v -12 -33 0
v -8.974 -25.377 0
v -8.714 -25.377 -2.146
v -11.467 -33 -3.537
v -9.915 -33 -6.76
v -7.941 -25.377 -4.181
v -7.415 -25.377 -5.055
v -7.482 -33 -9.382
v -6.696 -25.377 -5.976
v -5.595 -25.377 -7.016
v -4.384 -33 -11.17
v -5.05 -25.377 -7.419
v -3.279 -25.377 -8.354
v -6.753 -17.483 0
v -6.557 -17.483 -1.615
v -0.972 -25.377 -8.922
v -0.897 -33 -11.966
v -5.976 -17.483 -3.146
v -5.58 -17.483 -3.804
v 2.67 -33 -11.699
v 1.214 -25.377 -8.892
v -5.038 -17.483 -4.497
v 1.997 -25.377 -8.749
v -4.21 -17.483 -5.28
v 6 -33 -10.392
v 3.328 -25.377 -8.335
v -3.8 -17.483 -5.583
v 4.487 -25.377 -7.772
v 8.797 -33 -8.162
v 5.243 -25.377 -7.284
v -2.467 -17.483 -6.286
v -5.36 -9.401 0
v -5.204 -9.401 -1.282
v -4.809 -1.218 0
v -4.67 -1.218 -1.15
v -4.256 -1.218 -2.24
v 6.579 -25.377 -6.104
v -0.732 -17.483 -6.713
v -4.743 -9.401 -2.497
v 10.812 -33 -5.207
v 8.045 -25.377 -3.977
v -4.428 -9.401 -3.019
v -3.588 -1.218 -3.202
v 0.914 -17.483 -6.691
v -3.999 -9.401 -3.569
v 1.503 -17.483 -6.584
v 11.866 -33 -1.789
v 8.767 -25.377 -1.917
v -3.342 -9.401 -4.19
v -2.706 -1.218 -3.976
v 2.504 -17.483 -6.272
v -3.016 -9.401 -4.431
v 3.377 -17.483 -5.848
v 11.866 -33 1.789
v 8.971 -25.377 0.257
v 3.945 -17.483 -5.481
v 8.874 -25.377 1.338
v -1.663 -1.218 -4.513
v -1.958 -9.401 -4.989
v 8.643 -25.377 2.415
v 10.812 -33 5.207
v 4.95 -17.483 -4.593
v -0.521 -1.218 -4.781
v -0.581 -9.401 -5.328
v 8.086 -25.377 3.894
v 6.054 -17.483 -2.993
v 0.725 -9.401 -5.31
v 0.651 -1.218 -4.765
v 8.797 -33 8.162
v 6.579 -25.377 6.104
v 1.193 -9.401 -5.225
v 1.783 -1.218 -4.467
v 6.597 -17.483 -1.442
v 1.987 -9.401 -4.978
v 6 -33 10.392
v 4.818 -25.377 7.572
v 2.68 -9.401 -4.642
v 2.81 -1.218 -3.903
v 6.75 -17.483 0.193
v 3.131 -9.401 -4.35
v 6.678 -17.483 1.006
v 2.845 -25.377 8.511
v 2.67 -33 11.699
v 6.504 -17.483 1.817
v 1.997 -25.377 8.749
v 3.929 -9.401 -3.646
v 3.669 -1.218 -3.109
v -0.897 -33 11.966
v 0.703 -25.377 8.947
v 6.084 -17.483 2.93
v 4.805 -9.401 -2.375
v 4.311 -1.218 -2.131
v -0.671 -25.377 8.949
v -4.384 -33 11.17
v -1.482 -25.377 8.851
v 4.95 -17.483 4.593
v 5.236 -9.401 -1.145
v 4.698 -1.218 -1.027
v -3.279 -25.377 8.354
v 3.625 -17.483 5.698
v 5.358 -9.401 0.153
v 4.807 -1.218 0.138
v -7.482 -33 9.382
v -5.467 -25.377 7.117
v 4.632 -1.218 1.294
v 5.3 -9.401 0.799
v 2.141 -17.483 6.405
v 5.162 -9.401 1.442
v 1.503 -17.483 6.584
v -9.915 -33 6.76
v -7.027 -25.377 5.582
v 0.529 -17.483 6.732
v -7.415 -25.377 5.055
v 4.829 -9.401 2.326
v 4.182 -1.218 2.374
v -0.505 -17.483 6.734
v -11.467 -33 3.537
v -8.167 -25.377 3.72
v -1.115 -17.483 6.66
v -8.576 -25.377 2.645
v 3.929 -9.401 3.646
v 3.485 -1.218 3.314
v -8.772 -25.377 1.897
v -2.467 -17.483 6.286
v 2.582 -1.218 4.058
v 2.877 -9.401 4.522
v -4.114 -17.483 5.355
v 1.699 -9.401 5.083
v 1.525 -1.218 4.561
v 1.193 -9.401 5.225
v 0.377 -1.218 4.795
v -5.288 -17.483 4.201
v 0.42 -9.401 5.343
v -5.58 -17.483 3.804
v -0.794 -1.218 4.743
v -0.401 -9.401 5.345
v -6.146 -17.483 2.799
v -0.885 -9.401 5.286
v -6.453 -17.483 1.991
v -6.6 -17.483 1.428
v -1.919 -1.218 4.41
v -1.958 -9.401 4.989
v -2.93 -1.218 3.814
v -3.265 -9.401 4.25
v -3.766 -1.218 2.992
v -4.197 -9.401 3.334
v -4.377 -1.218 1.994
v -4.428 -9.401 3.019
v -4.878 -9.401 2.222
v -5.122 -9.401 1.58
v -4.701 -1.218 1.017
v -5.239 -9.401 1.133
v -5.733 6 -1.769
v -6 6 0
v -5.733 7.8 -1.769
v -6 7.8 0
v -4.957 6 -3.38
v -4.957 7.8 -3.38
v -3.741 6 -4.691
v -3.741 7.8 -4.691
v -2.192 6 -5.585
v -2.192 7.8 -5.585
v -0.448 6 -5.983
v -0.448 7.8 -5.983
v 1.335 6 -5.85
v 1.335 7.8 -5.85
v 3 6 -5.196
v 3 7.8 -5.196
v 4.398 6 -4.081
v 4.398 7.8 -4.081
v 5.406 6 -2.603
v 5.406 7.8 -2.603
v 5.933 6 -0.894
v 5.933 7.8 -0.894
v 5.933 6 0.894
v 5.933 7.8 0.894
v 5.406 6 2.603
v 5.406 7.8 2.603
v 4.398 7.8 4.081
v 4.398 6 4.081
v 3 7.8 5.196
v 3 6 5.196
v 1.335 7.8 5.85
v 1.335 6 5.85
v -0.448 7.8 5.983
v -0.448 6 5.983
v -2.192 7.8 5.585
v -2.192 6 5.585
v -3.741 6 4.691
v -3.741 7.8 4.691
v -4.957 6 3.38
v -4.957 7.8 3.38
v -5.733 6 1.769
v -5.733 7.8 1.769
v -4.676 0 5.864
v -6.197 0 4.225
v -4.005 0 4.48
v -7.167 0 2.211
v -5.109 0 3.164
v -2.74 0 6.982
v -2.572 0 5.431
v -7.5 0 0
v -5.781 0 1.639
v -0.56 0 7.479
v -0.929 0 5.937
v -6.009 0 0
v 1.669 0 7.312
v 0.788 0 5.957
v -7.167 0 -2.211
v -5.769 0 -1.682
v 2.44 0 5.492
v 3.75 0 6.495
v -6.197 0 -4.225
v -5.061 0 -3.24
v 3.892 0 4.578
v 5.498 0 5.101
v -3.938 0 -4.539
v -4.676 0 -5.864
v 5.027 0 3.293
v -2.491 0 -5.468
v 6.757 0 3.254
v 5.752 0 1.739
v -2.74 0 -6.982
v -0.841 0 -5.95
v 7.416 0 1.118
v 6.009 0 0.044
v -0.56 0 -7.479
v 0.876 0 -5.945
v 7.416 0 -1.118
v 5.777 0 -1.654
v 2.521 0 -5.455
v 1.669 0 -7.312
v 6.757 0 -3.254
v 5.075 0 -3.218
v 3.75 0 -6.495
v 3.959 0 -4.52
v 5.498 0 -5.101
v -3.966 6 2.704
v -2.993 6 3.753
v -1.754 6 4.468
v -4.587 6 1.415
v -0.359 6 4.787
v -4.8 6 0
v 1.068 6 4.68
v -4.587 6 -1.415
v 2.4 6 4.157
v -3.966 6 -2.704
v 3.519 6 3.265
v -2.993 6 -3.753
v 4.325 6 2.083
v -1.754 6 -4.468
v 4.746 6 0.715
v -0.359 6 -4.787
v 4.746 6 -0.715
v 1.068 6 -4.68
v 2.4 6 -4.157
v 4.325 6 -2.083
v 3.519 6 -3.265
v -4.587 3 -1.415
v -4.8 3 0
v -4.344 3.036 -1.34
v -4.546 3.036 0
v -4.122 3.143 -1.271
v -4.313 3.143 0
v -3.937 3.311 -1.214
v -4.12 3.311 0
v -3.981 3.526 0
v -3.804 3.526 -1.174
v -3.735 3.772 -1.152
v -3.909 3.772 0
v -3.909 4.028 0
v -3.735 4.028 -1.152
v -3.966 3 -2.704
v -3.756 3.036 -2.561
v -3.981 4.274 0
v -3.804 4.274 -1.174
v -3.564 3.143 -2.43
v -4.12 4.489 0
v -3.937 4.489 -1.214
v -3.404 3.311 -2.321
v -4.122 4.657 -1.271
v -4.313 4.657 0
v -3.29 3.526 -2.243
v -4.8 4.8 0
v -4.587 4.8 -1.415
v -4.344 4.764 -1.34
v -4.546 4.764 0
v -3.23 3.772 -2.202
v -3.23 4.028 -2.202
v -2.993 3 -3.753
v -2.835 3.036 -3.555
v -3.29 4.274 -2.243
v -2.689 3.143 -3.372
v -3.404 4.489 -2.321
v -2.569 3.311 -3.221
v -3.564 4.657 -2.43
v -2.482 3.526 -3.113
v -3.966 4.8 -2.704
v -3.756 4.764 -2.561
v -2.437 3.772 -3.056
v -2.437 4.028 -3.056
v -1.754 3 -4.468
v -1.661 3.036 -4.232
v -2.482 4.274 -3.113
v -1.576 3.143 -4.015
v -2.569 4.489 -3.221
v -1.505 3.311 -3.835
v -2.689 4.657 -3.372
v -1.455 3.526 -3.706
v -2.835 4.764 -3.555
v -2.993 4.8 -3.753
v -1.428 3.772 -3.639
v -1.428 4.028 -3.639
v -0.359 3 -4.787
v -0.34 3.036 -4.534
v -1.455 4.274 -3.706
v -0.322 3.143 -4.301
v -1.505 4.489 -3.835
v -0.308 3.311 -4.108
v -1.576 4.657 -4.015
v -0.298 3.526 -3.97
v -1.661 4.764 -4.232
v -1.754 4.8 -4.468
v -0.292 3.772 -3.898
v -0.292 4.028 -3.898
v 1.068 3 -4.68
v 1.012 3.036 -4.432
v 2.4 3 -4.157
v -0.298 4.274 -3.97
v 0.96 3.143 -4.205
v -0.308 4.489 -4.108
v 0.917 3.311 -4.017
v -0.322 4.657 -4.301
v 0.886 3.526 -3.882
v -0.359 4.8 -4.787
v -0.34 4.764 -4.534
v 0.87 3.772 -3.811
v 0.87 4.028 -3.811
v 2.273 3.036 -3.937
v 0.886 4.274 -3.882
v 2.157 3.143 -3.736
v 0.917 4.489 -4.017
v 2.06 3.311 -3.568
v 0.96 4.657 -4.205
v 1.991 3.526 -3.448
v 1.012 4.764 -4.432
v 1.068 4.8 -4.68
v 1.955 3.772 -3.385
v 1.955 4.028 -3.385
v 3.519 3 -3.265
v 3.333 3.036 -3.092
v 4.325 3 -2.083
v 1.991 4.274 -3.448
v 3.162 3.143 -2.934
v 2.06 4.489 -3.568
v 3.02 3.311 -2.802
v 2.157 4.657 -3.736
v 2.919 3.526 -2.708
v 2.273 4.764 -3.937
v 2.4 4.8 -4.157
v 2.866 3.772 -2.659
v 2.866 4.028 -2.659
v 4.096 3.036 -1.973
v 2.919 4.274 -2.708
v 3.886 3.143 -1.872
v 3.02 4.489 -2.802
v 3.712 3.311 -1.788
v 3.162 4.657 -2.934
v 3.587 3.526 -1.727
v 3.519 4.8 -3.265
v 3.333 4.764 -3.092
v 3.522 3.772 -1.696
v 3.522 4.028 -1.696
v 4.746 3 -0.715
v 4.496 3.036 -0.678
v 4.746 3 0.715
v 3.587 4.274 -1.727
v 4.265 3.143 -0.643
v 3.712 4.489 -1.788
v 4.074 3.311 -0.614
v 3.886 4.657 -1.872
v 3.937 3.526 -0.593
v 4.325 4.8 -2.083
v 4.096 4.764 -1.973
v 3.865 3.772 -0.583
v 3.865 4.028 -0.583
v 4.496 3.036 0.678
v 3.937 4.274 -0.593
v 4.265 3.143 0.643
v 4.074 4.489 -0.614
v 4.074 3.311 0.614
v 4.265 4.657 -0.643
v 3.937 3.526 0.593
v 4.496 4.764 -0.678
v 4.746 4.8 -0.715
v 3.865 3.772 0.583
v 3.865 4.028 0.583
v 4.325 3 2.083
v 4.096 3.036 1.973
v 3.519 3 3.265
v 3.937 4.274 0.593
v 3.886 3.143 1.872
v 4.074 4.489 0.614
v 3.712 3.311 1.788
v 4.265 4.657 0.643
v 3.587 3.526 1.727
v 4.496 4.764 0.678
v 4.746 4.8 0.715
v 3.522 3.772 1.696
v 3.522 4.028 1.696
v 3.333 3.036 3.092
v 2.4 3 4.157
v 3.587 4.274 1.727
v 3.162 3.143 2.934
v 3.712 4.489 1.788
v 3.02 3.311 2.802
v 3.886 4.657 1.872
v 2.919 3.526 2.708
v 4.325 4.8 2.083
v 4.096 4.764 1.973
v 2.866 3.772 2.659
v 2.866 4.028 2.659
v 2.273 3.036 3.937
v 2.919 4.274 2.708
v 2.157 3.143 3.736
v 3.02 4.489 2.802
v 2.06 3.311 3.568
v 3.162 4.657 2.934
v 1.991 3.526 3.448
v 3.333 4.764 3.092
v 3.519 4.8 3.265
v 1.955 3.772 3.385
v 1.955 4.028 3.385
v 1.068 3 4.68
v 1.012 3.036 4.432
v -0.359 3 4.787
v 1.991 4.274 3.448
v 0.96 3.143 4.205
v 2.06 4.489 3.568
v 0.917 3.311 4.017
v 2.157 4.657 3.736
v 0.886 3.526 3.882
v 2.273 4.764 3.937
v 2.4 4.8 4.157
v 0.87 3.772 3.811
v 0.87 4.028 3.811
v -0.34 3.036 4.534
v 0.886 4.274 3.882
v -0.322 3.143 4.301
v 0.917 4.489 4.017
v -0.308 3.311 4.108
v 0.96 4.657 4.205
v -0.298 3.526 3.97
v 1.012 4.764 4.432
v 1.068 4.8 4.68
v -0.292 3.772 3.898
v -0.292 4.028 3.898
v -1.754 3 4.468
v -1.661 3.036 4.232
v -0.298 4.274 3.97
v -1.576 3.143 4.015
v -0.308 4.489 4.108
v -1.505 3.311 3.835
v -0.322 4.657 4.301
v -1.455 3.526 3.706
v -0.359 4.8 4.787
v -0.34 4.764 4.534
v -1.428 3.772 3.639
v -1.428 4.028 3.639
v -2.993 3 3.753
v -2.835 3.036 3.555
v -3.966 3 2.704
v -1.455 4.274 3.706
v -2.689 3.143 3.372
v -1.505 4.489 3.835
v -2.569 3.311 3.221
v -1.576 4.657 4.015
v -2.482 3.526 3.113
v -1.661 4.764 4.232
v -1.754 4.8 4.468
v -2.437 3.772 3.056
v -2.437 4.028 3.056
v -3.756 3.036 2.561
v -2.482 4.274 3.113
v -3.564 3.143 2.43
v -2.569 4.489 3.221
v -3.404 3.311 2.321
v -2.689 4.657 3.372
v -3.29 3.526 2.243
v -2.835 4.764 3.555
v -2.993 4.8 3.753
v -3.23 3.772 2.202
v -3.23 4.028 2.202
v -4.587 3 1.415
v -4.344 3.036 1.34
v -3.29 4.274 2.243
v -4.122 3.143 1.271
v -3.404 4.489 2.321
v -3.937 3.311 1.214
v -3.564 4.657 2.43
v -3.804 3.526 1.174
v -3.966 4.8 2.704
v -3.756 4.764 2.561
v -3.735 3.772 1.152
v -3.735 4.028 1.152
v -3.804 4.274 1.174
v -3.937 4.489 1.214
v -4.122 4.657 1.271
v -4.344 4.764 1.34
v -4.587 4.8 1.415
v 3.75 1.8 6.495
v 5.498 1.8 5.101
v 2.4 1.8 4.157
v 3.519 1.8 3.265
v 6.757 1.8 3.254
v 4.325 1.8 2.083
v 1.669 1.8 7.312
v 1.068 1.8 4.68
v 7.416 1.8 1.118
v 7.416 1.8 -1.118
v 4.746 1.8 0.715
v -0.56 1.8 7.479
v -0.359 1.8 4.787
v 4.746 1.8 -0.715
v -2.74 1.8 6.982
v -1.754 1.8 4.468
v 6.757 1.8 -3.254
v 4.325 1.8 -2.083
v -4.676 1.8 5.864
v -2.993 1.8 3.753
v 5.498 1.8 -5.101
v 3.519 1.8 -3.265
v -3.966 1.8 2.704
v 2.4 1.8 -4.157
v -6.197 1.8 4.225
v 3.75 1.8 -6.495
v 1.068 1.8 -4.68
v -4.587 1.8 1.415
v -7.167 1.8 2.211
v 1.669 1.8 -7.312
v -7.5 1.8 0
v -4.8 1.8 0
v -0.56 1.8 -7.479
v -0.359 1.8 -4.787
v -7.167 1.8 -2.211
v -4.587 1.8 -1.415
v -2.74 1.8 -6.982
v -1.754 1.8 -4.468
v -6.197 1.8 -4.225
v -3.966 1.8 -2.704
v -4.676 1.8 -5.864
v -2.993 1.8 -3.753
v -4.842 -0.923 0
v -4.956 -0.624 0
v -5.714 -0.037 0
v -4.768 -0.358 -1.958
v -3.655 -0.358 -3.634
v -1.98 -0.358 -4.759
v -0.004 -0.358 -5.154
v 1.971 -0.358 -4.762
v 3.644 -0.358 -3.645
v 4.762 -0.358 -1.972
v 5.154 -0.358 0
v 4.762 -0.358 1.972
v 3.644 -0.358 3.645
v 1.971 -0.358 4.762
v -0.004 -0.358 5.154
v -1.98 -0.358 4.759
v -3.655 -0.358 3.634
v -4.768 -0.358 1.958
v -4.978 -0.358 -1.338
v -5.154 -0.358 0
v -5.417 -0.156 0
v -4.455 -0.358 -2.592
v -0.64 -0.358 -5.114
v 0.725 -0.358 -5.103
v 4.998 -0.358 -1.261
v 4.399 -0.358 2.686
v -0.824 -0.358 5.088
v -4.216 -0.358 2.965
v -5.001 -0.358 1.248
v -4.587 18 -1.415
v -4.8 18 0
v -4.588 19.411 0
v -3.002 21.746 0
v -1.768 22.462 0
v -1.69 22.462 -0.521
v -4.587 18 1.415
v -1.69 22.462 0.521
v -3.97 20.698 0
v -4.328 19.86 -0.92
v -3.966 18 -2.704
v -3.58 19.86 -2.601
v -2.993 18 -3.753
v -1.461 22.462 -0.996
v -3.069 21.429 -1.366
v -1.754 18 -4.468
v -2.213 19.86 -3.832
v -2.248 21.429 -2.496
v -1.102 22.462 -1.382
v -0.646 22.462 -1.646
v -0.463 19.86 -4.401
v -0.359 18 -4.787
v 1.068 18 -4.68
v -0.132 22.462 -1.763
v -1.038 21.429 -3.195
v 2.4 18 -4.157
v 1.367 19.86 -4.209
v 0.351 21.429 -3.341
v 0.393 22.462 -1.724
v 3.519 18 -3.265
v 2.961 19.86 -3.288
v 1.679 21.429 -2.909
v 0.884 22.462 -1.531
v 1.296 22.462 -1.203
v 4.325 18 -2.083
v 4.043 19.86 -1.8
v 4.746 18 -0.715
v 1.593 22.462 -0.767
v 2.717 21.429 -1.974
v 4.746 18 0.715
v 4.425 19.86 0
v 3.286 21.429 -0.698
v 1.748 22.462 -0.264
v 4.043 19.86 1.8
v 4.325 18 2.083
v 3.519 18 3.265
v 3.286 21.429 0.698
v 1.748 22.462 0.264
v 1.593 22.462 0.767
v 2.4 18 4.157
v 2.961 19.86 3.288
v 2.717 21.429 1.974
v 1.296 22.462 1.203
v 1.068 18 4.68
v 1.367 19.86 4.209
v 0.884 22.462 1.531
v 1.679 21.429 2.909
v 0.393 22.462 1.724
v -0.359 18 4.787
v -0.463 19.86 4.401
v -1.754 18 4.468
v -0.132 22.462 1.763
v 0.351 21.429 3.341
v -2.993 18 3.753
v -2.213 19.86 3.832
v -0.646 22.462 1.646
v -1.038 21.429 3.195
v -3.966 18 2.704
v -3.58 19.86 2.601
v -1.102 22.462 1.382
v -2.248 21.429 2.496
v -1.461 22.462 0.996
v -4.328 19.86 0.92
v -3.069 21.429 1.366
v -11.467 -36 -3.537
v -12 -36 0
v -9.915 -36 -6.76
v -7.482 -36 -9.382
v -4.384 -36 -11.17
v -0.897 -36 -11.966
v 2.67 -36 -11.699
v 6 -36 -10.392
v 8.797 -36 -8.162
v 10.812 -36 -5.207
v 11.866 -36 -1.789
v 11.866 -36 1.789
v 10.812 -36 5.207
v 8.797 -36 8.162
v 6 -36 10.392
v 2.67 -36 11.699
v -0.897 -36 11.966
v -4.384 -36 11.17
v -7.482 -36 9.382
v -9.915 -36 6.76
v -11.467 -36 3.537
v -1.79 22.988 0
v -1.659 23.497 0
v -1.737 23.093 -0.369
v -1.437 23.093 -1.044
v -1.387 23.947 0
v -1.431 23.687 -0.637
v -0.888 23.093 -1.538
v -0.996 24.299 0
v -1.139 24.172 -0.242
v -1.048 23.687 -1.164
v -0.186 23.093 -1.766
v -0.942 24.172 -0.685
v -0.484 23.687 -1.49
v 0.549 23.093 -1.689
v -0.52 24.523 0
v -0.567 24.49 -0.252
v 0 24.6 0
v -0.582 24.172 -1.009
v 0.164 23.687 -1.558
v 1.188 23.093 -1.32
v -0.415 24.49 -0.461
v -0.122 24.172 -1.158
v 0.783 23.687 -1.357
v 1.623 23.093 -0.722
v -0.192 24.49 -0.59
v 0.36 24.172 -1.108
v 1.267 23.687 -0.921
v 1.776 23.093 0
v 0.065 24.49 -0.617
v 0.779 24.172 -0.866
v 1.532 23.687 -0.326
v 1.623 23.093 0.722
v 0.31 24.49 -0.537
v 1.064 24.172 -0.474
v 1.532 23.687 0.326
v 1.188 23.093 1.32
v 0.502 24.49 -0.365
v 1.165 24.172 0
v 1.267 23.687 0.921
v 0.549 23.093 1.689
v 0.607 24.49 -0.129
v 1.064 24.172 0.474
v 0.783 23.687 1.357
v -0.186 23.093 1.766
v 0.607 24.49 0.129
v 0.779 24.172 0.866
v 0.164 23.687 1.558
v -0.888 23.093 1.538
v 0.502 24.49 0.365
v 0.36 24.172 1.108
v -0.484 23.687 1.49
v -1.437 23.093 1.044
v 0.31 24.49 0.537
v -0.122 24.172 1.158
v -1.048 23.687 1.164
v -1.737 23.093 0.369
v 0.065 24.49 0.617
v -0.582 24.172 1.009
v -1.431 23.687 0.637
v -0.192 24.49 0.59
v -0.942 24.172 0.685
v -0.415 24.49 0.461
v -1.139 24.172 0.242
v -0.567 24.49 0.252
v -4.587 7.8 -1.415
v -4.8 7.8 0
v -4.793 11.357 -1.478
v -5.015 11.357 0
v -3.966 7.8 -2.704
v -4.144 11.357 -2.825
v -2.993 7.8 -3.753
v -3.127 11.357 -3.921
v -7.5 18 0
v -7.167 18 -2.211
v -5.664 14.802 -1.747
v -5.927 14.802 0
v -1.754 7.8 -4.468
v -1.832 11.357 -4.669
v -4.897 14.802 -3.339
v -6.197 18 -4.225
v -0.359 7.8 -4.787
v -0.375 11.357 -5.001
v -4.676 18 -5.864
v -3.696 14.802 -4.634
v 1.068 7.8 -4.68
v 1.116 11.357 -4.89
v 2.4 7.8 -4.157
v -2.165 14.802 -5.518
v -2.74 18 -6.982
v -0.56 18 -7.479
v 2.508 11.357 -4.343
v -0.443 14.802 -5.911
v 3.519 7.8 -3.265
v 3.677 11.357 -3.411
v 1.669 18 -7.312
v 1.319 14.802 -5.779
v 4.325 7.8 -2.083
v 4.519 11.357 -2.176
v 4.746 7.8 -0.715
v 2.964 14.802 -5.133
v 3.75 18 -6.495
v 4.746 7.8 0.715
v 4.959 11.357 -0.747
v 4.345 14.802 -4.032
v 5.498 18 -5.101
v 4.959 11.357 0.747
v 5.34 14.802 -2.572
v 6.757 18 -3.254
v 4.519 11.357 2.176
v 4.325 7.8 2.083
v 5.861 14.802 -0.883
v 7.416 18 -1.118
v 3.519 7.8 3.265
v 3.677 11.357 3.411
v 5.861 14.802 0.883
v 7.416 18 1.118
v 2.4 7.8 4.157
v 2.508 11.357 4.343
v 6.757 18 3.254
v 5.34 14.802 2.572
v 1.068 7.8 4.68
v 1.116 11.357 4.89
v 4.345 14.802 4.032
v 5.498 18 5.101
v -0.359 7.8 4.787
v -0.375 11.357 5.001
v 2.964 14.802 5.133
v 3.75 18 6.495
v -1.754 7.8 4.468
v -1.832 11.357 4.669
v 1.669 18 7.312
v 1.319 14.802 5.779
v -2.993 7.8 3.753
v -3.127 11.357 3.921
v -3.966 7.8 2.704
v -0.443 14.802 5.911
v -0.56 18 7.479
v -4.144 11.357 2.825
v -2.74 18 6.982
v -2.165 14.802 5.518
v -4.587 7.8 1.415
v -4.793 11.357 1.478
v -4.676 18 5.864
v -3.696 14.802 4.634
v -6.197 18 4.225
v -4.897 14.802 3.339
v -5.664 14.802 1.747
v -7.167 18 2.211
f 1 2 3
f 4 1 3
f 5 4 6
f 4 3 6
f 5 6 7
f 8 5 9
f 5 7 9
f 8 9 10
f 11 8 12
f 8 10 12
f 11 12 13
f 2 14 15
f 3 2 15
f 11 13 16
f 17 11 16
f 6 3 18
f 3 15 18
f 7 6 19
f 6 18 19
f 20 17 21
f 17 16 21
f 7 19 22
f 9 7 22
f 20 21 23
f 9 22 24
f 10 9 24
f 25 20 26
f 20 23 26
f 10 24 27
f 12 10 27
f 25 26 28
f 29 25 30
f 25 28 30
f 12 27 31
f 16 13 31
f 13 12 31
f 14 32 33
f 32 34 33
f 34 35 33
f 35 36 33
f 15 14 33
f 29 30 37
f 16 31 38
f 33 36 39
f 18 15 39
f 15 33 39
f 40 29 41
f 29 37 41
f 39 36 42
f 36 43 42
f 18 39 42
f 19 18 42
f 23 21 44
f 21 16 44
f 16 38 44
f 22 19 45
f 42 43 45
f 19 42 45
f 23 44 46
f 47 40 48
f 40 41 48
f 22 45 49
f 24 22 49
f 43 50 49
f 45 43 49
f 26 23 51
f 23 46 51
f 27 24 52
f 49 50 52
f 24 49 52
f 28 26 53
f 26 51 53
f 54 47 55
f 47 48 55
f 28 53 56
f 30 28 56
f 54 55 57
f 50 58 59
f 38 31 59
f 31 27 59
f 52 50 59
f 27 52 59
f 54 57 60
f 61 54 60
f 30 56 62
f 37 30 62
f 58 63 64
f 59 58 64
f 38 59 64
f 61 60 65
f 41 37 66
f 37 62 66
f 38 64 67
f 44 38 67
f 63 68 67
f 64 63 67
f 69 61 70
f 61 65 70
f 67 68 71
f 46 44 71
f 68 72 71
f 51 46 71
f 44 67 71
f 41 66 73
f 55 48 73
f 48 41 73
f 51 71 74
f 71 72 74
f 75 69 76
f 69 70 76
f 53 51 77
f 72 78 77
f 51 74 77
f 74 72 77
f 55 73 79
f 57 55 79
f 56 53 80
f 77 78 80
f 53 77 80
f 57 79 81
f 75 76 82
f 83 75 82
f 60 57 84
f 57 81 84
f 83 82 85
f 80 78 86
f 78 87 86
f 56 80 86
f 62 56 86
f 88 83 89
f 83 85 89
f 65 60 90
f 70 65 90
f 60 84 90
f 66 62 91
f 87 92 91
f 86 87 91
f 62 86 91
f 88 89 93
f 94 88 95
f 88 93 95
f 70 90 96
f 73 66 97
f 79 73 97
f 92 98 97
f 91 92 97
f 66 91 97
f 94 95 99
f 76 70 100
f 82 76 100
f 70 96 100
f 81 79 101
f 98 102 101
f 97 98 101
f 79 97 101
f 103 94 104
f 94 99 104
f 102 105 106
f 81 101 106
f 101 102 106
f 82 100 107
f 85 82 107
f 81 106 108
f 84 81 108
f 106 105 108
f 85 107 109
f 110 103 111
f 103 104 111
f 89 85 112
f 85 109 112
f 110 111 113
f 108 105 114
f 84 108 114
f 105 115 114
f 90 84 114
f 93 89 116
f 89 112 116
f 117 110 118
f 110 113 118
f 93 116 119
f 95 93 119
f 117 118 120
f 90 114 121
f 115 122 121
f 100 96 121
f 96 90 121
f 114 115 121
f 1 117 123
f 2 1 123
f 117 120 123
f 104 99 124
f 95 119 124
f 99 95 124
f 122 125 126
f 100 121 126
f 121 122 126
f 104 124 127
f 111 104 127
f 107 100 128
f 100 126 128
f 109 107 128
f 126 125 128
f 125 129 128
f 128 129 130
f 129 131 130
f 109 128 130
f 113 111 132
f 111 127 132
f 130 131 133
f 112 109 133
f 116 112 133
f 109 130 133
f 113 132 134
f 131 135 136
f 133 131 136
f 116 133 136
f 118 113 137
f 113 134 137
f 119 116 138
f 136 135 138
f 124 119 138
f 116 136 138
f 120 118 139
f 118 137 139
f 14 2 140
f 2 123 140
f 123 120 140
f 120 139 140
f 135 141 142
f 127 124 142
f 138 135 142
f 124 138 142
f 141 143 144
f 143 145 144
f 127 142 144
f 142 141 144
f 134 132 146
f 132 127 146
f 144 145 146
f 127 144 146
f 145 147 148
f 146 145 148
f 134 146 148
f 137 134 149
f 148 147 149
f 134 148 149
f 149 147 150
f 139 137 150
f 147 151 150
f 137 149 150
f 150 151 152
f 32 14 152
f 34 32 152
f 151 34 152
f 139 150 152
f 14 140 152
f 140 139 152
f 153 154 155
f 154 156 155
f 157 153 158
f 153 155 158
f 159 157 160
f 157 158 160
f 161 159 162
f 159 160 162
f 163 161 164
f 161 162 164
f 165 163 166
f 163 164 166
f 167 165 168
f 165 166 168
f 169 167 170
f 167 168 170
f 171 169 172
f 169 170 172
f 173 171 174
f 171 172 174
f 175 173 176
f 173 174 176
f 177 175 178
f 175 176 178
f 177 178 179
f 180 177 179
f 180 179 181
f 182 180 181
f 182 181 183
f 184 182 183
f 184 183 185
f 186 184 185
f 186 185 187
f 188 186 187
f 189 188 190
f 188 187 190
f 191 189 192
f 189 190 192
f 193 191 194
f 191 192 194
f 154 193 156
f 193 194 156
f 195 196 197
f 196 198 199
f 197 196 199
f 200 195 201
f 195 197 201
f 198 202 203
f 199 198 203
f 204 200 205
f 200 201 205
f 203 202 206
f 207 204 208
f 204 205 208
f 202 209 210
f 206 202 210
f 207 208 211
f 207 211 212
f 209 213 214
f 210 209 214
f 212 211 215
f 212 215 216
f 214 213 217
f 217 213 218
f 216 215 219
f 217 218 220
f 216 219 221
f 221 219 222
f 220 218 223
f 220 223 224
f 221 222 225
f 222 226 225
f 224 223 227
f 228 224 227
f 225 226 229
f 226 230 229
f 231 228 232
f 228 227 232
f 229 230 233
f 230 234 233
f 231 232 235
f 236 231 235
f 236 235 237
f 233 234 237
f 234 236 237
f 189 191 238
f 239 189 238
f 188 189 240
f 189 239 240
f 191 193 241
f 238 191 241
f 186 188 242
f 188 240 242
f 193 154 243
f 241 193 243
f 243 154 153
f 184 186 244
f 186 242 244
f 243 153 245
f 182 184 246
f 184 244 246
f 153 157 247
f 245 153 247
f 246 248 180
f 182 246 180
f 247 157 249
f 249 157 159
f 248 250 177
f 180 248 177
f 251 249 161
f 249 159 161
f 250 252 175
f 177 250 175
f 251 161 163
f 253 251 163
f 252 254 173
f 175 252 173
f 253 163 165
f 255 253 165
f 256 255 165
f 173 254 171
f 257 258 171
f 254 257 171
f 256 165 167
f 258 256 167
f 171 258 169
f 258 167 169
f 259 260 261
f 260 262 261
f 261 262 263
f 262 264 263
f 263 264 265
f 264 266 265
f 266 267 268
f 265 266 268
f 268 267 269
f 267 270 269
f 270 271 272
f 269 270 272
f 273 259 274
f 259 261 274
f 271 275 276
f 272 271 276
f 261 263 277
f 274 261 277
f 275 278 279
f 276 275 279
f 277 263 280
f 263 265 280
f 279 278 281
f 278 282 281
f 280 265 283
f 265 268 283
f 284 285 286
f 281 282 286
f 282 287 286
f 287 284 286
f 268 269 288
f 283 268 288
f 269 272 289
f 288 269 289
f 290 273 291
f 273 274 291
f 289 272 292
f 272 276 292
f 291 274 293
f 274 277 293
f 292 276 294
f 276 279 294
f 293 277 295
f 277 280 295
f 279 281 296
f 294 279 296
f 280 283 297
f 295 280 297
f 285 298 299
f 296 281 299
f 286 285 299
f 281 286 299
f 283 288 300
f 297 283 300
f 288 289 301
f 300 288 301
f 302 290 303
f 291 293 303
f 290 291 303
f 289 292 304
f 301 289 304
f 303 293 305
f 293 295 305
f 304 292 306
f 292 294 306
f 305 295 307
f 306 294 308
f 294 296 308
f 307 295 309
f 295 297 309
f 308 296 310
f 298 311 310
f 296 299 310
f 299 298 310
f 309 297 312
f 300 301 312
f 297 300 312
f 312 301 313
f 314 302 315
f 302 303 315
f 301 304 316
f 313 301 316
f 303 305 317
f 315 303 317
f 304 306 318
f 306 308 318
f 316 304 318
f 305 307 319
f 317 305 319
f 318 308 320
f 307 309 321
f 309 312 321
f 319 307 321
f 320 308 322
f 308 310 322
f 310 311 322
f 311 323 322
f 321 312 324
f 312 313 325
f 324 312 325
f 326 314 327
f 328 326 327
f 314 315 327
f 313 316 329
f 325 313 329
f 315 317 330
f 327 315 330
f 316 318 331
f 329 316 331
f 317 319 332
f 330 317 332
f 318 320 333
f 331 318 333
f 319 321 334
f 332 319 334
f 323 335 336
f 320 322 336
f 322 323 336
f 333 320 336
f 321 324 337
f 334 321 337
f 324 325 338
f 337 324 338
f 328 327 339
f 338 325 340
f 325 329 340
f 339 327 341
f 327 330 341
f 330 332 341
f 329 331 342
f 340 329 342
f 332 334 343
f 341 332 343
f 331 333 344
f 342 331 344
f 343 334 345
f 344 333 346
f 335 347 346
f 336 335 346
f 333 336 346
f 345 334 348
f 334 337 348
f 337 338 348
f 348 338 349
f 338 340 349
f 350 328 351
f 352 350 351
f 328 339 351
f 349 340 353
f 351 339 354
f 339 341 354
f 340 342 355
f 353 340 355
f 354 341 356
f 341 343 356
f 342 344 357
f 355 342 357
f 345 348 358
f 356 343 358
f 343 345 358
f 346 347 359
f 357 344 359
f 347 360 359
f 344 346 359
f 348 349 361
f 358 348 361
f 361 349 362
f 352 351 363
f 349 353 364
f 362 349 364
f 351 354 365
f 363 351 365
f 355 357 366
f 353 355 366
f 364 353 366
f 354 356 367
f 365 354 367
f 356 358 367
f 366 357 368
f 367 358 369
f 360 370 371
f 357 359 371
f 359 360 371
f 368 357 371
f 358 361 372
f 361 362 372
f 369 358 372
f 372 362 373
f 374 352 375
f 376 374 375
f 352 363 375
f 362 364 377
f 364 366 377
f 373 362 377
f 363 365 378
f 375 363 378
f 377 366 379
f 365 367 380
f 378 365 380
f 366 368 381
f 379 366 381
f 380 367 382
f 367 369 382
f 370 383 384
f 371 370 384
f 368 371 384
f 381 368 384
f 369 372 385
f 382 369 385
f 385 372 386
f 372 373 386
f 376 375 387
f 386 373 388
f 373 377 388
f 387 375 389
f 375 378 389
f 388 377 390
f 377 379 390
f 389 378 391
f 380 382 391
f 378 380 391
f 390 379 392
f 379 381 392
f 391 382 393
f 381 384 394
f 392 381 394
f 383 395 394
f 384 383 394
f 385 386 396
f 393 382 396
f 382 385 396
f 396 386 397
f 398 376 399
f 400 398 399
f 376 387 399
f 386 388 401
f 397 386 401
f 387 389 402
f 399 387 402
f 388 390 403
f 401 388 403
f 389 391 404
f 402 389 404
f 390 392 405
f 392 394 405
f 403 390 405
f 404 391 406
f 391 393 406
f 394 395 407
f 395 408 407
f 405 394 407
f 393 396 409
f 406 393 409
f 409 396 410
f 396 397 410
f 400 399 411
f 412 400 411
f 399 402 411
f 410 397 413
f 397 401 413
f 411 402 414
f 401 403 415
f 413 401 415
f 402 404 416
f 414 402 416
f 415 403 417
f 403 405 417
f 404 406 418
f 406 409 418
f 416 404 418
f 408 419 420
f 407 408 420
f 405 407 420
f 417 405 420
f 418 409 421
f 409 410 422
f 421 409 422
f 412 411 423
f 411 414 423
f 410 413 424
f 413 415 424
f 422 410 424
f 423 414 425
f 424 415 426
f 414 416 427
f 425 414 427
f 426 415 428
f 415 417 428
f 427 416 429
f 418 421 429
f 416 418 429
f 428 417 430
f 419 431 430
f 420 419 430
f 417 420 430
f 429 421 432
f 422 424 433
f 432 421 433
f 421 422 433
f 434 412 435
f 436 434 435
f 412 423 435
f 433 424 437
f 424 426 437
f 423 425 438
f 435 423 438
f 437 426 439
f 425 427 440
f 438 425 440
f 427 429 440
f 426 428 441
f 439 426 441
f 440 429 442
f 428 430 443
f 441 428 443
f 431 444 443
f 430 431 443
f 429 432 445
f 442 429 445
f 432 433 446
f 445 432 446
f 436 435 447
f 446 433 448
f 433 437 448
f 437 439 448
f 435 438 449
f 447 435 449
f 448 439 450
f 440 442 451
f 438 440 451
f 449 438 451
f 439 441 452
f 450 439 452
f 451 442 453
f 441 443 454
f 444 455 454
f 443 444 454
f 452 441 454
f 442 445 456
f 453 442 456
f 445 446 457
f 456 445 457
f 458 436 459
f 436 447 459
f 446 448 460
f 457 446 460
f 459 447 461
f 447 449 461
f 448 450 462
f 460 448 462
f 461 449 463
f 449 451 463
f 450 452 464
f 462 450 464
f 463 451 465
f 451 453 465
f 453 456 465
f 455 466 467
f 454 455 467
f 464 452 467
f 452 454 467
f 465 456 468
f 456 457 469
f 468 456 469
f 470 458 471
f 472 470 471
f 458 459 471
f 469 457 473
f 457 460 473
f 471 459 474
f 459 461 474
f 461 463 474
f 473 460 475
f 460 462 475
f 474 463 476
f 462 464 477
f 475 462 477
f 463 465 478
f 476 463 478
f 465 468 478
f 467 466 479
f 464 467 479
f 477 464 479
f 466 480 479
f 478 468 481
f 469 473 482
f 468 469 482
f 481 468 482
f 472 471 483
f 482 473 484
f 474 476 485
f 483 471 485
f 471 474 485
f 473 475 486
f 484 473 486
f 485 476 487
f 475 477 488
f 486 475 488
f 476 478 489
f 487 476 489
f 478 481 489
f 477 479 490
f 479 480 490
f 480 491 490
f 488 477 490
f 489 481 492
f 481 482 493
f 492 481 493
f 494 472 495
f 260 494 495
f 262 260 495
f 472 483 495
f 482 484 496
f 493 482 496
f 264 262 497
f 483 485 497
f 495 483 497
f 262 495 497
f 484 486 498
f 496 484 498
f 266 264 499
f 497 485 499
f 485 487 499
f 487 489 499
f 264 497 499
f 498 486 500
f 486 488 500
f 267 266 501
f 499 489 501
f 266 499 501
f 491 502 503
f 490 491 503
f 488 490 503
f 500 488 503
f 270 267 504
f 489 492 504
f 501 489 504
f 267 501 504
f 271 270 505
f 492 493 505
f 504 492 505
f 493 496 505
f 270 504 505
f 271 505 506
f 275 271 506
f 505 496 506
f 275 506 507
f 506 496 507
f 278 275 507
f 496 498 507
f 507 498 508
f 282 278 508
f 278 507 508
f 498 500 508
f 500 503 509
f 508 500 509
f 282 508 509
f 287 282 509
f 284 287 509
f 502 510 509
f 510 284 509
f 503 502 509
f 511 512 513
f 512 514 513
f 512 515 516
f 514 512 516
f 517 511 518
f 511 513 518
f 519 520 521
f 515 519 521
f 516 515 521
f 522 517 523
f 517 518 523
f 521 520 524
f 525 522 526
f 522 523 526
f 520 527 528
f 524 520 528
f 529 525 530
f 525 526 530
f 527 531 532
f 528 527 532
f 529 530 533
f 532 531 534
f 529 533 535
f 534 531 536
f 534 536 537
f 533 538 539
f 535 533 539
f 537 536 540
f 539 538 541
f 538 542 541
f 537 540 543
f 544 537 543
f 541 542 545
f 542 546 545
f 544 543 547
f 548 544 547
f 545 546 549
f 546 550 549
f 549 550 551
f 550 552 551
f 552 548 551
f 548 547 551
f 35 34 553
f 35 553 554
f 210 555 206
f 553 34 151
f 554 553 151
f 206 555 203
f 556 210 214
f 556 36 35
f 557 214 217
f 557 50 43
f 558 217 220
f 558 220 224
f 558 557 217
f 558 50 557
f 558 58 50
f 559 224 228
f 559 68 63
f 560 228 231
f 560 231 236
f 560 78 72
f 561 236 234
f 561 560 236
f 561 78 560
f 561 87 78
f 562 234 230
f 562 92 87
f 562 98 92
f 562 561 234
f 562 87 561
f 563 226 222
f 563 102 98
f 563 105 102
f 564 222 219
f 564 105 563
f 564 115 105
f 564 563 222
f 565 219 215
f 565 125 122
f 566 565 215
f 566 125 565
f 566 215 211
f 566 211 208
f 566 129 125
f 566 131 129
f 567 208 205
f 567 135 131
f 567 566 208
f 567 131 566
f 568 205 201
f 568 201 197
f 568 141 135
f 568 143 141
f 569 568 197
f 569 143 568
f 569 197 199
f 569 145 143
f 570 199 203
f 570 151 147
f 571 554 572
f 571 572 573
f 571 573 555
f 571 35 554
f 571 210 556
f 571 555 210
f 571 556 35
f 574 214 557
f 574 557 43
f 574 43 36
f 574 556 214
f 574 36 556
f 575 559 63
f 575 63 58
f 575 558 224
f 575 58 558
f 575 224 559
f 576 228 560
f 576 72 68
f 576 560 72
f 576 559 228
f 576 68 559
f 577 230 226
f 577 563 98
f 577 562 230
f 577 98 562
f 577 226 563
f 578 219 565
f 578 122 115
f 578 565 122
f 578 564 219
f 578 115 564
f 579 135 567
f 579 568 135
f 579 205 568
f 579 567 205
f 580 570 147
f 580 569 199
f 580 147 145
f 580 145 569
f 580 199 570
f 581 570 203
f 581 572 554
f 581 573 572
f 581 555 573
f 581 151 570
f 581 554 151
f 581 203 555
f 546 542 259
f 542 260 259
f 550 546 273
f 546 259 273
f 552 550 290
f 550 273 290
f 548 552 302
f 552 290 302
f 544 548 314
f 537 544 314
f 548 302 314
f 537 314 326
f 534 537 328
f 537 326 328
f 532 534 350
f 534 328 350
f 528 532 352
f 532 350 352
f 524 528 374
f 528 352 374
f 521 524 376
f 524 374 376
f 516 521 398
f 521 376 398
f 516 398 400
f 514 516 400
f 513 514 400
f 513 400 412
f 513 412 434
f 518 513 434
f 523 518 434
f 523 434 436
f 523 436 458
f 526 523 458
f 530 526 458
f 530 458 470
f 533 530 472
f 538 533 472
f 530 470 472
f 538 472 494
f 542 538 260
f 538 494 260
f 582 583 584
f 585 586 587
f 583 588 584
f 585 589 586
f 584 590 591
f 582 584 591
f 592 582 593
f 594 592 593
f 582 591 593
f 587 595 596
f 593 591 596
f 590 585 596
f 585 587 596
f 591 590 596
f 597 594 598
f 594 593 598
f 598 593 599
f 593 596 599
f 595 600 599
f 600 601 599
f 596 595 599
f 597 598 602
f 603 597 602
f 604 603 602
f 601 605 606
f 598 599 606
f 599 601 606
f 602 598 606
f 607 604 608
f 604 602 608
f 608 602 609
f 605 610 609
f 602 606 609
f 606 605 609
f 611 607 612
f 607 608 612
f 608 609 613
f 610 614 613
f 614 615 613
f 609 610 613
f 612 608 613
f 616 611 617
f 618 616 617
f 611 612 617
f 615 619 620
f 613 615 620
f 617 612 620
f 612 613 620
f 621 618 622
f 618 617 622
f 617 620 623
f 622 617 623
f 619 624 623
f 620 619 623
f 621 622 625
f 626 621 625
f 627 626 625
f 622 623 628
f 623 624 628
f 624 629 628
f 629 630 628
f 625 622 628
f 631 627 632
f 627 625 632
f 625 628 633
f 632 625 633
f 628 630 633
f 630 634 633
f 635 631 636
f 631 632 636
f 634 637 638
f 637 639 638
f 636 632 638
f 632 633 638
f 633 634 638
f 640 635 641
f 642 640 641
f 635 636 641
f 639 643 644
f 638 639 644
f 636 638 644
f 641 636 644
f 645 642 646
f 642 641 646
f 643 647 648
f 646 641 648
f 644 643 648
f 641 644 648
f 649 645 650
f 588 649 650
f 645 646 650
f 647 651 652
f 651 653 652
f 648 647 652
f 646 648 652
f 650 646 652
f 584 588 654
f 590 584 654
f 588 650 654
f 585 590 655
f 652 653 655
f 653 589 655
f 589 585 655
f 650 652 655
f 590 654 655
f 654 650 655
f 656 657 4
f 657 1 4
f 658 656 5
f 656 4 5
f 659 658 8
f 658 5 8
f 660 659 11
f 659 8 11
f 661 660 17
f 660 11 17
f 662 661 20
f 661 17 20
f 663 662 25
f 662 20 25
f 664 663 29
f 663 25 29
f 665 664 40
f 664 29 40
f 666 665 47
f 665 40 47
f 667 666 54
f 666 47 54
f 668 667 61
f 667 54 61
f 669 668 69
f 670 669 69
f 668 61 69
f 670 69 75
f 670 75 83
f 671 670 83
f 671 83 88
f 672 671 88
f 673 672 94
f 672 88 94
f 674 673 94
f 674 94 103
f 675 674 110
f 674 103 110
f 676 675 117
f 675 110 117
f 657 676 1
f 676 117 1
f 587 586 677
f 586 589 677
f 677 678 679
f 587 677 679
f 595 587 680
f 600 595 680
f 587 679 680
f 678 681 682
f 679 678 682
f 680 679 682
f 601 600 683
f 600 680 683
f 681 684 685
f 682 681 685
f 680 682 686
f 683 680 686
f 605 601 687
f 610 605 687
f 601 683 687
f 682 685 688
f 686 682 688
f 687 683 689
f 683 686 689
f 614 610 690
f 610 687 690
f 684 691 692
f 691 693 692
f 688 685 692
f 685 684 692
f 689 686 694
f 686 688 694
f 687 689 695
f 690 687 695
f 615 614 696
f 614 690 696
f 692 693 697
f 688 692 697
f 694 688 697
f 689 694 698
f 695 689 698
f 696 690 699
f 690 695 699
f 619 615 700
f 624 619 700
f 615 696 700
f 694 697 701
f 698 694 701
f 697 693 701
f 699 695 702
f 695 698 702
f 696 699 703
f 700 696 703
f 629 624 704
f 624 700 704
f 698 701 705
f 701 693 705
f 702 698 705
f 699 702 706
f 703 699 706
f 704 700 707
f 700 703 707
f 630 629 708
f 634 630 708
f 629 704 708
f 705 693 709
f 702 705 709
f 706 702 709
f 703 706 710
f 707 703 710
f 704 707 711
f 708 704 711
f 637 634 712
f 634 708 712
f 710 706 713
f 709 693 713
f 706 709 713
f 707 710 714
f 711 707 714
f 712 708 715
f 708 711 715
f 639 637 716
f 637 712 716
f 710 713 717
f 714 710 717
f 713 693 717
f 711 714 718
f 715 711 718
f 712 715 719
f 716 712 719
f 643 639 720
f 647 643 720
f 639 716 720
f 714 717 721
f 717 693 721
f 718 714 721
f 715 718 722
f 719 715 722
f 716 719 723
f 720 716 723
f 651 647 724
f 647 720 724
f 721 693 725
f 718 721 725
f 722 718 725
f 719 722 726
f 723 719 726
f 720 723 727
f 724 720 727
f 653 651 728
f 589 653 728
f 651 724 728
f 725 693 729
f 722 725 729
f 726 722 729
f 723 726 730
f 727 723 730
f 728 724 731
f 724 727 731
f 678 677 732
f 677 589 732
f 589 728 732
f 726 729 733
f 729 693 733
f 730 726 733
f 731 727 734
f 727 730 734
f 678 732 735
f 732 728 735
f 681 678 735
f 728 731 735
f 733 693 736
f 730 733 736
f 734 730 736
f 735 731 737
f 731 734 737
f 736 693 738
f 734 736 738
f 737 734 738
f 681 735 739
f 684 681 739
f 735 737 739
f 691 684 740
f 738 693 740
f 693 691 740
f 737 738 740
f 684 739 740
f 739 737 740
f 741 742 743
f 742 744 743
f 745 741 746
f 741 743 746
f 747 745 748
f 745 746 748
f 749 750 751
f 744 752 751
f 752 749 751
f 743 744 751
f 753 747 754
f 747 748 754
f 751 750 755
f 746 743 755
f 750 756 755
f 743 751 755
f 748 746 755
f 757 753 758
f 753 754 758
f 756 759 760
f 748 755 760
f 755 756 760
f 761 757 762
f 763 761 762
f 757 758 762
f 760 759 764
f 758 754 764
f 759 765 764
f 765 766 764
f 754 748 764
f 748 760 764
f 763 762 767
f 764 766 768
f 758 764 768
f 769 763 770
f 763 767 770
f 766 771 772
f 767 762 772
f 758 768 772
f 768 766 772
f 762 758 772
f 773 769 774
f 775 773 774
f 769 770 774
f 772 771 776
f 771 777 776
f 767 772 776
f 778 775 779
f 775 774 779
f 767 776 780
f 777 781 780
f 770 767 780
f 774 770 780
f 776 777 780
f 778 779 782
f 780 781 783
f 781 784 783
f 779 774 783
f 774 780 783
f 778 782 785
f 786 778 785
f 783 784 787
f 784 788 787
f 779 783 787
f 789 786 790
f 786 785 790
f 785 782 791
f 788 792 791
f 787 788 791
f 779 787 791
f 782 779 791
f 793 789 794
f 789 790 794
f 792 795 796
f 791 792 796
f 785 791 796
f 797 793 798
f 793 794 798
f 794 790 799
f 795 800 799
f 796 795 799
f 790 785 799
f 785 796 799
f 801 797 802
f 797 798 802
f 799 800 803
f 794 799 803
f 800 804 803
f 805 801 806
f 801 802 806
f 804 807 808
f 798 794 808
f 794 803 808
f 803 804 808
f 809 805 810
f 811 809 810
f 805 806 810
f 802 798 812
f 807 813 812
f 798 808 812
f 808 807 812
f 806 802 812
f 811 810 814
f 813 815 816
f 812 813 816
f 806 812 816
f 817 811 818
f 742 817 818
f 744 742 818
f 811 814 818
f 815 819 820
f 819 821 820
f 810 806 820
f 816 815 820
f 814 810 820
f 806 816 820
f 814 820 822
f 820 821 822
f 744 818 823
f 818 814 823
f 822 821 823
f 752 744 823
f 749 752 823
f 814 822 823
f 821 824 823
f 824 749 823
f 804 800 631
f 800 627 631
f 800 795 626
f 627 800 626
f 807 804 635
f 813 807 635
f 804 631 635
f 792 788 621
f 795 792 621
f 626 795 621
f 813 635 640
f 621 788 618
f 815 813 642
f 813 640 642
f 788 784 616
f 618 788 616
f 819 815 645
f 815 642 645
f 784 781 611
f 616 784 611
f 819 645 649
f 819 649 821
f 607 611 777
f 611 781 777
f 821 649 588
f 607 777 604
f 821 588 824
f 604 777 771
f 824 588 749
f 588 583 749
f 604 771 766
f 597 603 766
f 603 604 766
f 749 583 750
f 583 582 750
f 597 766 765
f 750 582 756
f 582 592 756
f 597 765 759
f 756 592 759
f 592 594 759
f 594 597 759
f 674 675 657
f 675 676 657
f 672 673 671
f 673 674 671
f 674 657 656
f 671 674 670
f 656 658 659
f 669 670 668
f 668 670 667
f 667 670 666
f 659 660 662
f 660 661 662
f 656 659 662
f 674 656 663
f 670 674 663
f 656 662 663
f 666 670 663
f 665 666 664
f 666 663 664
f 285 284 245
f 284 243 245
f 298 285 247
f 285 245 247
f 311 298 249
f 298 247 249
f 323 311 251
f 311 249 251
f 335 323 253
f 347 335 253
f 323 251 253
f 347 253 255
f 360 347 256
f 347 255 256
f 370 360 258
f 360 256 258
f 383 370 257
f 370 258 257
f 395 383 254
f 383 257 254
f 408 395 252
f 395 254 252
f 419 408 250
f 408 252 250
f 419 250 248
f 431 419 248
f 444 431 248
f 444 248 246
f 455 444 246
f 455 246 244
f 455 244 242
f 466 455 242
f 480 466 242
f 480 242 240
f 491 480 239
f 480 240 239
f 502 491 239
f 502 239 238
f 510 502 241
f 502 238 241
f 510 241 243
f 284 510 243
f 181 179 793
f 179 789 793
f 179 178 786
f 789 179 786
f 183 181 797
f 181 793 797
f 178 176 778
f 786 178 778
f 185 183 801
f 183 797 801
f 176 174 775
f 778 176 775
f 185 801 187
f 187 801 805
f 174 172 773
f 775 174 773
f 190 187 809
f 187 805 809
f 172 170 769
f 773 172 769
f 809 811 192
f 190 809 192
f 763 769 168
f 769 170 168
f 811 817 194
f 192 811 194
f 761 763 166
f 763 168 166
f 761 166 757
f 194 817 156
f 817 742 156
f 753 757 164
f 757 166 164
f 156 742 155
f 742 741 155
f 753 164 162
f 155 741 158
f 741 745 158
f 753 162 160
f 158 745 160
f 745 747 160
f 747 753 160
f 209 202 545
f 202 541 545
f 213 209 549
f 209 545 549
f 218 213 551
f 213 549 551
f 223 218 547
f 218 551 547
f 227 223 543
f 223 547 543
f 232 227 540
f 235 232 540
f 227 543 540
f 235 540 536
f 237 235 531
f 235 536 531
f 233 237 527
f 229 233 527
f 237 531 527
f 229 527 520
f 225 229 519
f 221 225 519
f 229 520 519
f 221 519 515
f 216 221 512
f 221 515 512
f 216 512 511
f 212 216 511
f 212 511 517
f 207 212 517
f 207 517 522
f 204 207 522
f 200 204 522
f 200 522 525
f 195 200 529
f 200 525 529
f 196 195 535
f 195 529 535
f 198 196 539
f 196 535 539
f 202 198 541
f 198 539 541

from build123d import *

# Parameters (mm, degrees)
FILLET1_R     = 2
SCALE_1_SCALE = 0.6


with BuildPart() as part:
    # Sketch1 → Revolve1 (revolve)
    with BuildSketch(Plane.XY, mode=Mode.PRIVATE) as revolve1_sk:
        with BuildLine():
            Line((0, -60), (20, -60))
            Line((20, -60), (20, -55))
            ThreePointArc((20, -55), (11.03487717, -28.14693589), (8, 0))
            Line((8, 0), (12.5, 0))
            Line((12.5, 0), (12.5, 3))
            Line((12.5, 3), (8, 3))
            Line((8, 3), (8, 5))
            ThreePointArc((8, 5), (6.5, 6.5), (8, 8))
            Line((8, 8), (8, 10))
            Line((8, 10), (10, 10))
            Line((10, 10), (10, 13))
            Line((10, 13), (8, 13))
            ThreePointArc((8, 13), (8.976394405, 21.837130893), (12.5, 30))
            Line((12.5, 30), (8, 30))
            ThreePointArc((8, 30), (6.617187865, 34.495867521), (2.946793809, 37.4375))
            ThreePointArc((2.946793809, 37.4375), (2.311655251, 39.912132318), (0, 41))
            Line((0, 41), (0, -60))
        make_face()
    revolve(revolve1_sk.sketch.rotate(Axis((0, 50, 0), (0, -1, 0)), 180), axis=Axis((0, 50, 0), (0, -1, 0)))

    # Fillet1
    fillet1_edges = [part.edges().sort_by_distance(p)[0] for p in [
        (8, 0, 0),
    ]]
    fillet(fillet1_edges, radius=FILLET1_R)


with BuildPart() as part_1:
    # 缩放比例1: scaled about (0, 0, 0)
    add(part.part.scale(SCALE_1_SCALE))


solid = part_1.part
